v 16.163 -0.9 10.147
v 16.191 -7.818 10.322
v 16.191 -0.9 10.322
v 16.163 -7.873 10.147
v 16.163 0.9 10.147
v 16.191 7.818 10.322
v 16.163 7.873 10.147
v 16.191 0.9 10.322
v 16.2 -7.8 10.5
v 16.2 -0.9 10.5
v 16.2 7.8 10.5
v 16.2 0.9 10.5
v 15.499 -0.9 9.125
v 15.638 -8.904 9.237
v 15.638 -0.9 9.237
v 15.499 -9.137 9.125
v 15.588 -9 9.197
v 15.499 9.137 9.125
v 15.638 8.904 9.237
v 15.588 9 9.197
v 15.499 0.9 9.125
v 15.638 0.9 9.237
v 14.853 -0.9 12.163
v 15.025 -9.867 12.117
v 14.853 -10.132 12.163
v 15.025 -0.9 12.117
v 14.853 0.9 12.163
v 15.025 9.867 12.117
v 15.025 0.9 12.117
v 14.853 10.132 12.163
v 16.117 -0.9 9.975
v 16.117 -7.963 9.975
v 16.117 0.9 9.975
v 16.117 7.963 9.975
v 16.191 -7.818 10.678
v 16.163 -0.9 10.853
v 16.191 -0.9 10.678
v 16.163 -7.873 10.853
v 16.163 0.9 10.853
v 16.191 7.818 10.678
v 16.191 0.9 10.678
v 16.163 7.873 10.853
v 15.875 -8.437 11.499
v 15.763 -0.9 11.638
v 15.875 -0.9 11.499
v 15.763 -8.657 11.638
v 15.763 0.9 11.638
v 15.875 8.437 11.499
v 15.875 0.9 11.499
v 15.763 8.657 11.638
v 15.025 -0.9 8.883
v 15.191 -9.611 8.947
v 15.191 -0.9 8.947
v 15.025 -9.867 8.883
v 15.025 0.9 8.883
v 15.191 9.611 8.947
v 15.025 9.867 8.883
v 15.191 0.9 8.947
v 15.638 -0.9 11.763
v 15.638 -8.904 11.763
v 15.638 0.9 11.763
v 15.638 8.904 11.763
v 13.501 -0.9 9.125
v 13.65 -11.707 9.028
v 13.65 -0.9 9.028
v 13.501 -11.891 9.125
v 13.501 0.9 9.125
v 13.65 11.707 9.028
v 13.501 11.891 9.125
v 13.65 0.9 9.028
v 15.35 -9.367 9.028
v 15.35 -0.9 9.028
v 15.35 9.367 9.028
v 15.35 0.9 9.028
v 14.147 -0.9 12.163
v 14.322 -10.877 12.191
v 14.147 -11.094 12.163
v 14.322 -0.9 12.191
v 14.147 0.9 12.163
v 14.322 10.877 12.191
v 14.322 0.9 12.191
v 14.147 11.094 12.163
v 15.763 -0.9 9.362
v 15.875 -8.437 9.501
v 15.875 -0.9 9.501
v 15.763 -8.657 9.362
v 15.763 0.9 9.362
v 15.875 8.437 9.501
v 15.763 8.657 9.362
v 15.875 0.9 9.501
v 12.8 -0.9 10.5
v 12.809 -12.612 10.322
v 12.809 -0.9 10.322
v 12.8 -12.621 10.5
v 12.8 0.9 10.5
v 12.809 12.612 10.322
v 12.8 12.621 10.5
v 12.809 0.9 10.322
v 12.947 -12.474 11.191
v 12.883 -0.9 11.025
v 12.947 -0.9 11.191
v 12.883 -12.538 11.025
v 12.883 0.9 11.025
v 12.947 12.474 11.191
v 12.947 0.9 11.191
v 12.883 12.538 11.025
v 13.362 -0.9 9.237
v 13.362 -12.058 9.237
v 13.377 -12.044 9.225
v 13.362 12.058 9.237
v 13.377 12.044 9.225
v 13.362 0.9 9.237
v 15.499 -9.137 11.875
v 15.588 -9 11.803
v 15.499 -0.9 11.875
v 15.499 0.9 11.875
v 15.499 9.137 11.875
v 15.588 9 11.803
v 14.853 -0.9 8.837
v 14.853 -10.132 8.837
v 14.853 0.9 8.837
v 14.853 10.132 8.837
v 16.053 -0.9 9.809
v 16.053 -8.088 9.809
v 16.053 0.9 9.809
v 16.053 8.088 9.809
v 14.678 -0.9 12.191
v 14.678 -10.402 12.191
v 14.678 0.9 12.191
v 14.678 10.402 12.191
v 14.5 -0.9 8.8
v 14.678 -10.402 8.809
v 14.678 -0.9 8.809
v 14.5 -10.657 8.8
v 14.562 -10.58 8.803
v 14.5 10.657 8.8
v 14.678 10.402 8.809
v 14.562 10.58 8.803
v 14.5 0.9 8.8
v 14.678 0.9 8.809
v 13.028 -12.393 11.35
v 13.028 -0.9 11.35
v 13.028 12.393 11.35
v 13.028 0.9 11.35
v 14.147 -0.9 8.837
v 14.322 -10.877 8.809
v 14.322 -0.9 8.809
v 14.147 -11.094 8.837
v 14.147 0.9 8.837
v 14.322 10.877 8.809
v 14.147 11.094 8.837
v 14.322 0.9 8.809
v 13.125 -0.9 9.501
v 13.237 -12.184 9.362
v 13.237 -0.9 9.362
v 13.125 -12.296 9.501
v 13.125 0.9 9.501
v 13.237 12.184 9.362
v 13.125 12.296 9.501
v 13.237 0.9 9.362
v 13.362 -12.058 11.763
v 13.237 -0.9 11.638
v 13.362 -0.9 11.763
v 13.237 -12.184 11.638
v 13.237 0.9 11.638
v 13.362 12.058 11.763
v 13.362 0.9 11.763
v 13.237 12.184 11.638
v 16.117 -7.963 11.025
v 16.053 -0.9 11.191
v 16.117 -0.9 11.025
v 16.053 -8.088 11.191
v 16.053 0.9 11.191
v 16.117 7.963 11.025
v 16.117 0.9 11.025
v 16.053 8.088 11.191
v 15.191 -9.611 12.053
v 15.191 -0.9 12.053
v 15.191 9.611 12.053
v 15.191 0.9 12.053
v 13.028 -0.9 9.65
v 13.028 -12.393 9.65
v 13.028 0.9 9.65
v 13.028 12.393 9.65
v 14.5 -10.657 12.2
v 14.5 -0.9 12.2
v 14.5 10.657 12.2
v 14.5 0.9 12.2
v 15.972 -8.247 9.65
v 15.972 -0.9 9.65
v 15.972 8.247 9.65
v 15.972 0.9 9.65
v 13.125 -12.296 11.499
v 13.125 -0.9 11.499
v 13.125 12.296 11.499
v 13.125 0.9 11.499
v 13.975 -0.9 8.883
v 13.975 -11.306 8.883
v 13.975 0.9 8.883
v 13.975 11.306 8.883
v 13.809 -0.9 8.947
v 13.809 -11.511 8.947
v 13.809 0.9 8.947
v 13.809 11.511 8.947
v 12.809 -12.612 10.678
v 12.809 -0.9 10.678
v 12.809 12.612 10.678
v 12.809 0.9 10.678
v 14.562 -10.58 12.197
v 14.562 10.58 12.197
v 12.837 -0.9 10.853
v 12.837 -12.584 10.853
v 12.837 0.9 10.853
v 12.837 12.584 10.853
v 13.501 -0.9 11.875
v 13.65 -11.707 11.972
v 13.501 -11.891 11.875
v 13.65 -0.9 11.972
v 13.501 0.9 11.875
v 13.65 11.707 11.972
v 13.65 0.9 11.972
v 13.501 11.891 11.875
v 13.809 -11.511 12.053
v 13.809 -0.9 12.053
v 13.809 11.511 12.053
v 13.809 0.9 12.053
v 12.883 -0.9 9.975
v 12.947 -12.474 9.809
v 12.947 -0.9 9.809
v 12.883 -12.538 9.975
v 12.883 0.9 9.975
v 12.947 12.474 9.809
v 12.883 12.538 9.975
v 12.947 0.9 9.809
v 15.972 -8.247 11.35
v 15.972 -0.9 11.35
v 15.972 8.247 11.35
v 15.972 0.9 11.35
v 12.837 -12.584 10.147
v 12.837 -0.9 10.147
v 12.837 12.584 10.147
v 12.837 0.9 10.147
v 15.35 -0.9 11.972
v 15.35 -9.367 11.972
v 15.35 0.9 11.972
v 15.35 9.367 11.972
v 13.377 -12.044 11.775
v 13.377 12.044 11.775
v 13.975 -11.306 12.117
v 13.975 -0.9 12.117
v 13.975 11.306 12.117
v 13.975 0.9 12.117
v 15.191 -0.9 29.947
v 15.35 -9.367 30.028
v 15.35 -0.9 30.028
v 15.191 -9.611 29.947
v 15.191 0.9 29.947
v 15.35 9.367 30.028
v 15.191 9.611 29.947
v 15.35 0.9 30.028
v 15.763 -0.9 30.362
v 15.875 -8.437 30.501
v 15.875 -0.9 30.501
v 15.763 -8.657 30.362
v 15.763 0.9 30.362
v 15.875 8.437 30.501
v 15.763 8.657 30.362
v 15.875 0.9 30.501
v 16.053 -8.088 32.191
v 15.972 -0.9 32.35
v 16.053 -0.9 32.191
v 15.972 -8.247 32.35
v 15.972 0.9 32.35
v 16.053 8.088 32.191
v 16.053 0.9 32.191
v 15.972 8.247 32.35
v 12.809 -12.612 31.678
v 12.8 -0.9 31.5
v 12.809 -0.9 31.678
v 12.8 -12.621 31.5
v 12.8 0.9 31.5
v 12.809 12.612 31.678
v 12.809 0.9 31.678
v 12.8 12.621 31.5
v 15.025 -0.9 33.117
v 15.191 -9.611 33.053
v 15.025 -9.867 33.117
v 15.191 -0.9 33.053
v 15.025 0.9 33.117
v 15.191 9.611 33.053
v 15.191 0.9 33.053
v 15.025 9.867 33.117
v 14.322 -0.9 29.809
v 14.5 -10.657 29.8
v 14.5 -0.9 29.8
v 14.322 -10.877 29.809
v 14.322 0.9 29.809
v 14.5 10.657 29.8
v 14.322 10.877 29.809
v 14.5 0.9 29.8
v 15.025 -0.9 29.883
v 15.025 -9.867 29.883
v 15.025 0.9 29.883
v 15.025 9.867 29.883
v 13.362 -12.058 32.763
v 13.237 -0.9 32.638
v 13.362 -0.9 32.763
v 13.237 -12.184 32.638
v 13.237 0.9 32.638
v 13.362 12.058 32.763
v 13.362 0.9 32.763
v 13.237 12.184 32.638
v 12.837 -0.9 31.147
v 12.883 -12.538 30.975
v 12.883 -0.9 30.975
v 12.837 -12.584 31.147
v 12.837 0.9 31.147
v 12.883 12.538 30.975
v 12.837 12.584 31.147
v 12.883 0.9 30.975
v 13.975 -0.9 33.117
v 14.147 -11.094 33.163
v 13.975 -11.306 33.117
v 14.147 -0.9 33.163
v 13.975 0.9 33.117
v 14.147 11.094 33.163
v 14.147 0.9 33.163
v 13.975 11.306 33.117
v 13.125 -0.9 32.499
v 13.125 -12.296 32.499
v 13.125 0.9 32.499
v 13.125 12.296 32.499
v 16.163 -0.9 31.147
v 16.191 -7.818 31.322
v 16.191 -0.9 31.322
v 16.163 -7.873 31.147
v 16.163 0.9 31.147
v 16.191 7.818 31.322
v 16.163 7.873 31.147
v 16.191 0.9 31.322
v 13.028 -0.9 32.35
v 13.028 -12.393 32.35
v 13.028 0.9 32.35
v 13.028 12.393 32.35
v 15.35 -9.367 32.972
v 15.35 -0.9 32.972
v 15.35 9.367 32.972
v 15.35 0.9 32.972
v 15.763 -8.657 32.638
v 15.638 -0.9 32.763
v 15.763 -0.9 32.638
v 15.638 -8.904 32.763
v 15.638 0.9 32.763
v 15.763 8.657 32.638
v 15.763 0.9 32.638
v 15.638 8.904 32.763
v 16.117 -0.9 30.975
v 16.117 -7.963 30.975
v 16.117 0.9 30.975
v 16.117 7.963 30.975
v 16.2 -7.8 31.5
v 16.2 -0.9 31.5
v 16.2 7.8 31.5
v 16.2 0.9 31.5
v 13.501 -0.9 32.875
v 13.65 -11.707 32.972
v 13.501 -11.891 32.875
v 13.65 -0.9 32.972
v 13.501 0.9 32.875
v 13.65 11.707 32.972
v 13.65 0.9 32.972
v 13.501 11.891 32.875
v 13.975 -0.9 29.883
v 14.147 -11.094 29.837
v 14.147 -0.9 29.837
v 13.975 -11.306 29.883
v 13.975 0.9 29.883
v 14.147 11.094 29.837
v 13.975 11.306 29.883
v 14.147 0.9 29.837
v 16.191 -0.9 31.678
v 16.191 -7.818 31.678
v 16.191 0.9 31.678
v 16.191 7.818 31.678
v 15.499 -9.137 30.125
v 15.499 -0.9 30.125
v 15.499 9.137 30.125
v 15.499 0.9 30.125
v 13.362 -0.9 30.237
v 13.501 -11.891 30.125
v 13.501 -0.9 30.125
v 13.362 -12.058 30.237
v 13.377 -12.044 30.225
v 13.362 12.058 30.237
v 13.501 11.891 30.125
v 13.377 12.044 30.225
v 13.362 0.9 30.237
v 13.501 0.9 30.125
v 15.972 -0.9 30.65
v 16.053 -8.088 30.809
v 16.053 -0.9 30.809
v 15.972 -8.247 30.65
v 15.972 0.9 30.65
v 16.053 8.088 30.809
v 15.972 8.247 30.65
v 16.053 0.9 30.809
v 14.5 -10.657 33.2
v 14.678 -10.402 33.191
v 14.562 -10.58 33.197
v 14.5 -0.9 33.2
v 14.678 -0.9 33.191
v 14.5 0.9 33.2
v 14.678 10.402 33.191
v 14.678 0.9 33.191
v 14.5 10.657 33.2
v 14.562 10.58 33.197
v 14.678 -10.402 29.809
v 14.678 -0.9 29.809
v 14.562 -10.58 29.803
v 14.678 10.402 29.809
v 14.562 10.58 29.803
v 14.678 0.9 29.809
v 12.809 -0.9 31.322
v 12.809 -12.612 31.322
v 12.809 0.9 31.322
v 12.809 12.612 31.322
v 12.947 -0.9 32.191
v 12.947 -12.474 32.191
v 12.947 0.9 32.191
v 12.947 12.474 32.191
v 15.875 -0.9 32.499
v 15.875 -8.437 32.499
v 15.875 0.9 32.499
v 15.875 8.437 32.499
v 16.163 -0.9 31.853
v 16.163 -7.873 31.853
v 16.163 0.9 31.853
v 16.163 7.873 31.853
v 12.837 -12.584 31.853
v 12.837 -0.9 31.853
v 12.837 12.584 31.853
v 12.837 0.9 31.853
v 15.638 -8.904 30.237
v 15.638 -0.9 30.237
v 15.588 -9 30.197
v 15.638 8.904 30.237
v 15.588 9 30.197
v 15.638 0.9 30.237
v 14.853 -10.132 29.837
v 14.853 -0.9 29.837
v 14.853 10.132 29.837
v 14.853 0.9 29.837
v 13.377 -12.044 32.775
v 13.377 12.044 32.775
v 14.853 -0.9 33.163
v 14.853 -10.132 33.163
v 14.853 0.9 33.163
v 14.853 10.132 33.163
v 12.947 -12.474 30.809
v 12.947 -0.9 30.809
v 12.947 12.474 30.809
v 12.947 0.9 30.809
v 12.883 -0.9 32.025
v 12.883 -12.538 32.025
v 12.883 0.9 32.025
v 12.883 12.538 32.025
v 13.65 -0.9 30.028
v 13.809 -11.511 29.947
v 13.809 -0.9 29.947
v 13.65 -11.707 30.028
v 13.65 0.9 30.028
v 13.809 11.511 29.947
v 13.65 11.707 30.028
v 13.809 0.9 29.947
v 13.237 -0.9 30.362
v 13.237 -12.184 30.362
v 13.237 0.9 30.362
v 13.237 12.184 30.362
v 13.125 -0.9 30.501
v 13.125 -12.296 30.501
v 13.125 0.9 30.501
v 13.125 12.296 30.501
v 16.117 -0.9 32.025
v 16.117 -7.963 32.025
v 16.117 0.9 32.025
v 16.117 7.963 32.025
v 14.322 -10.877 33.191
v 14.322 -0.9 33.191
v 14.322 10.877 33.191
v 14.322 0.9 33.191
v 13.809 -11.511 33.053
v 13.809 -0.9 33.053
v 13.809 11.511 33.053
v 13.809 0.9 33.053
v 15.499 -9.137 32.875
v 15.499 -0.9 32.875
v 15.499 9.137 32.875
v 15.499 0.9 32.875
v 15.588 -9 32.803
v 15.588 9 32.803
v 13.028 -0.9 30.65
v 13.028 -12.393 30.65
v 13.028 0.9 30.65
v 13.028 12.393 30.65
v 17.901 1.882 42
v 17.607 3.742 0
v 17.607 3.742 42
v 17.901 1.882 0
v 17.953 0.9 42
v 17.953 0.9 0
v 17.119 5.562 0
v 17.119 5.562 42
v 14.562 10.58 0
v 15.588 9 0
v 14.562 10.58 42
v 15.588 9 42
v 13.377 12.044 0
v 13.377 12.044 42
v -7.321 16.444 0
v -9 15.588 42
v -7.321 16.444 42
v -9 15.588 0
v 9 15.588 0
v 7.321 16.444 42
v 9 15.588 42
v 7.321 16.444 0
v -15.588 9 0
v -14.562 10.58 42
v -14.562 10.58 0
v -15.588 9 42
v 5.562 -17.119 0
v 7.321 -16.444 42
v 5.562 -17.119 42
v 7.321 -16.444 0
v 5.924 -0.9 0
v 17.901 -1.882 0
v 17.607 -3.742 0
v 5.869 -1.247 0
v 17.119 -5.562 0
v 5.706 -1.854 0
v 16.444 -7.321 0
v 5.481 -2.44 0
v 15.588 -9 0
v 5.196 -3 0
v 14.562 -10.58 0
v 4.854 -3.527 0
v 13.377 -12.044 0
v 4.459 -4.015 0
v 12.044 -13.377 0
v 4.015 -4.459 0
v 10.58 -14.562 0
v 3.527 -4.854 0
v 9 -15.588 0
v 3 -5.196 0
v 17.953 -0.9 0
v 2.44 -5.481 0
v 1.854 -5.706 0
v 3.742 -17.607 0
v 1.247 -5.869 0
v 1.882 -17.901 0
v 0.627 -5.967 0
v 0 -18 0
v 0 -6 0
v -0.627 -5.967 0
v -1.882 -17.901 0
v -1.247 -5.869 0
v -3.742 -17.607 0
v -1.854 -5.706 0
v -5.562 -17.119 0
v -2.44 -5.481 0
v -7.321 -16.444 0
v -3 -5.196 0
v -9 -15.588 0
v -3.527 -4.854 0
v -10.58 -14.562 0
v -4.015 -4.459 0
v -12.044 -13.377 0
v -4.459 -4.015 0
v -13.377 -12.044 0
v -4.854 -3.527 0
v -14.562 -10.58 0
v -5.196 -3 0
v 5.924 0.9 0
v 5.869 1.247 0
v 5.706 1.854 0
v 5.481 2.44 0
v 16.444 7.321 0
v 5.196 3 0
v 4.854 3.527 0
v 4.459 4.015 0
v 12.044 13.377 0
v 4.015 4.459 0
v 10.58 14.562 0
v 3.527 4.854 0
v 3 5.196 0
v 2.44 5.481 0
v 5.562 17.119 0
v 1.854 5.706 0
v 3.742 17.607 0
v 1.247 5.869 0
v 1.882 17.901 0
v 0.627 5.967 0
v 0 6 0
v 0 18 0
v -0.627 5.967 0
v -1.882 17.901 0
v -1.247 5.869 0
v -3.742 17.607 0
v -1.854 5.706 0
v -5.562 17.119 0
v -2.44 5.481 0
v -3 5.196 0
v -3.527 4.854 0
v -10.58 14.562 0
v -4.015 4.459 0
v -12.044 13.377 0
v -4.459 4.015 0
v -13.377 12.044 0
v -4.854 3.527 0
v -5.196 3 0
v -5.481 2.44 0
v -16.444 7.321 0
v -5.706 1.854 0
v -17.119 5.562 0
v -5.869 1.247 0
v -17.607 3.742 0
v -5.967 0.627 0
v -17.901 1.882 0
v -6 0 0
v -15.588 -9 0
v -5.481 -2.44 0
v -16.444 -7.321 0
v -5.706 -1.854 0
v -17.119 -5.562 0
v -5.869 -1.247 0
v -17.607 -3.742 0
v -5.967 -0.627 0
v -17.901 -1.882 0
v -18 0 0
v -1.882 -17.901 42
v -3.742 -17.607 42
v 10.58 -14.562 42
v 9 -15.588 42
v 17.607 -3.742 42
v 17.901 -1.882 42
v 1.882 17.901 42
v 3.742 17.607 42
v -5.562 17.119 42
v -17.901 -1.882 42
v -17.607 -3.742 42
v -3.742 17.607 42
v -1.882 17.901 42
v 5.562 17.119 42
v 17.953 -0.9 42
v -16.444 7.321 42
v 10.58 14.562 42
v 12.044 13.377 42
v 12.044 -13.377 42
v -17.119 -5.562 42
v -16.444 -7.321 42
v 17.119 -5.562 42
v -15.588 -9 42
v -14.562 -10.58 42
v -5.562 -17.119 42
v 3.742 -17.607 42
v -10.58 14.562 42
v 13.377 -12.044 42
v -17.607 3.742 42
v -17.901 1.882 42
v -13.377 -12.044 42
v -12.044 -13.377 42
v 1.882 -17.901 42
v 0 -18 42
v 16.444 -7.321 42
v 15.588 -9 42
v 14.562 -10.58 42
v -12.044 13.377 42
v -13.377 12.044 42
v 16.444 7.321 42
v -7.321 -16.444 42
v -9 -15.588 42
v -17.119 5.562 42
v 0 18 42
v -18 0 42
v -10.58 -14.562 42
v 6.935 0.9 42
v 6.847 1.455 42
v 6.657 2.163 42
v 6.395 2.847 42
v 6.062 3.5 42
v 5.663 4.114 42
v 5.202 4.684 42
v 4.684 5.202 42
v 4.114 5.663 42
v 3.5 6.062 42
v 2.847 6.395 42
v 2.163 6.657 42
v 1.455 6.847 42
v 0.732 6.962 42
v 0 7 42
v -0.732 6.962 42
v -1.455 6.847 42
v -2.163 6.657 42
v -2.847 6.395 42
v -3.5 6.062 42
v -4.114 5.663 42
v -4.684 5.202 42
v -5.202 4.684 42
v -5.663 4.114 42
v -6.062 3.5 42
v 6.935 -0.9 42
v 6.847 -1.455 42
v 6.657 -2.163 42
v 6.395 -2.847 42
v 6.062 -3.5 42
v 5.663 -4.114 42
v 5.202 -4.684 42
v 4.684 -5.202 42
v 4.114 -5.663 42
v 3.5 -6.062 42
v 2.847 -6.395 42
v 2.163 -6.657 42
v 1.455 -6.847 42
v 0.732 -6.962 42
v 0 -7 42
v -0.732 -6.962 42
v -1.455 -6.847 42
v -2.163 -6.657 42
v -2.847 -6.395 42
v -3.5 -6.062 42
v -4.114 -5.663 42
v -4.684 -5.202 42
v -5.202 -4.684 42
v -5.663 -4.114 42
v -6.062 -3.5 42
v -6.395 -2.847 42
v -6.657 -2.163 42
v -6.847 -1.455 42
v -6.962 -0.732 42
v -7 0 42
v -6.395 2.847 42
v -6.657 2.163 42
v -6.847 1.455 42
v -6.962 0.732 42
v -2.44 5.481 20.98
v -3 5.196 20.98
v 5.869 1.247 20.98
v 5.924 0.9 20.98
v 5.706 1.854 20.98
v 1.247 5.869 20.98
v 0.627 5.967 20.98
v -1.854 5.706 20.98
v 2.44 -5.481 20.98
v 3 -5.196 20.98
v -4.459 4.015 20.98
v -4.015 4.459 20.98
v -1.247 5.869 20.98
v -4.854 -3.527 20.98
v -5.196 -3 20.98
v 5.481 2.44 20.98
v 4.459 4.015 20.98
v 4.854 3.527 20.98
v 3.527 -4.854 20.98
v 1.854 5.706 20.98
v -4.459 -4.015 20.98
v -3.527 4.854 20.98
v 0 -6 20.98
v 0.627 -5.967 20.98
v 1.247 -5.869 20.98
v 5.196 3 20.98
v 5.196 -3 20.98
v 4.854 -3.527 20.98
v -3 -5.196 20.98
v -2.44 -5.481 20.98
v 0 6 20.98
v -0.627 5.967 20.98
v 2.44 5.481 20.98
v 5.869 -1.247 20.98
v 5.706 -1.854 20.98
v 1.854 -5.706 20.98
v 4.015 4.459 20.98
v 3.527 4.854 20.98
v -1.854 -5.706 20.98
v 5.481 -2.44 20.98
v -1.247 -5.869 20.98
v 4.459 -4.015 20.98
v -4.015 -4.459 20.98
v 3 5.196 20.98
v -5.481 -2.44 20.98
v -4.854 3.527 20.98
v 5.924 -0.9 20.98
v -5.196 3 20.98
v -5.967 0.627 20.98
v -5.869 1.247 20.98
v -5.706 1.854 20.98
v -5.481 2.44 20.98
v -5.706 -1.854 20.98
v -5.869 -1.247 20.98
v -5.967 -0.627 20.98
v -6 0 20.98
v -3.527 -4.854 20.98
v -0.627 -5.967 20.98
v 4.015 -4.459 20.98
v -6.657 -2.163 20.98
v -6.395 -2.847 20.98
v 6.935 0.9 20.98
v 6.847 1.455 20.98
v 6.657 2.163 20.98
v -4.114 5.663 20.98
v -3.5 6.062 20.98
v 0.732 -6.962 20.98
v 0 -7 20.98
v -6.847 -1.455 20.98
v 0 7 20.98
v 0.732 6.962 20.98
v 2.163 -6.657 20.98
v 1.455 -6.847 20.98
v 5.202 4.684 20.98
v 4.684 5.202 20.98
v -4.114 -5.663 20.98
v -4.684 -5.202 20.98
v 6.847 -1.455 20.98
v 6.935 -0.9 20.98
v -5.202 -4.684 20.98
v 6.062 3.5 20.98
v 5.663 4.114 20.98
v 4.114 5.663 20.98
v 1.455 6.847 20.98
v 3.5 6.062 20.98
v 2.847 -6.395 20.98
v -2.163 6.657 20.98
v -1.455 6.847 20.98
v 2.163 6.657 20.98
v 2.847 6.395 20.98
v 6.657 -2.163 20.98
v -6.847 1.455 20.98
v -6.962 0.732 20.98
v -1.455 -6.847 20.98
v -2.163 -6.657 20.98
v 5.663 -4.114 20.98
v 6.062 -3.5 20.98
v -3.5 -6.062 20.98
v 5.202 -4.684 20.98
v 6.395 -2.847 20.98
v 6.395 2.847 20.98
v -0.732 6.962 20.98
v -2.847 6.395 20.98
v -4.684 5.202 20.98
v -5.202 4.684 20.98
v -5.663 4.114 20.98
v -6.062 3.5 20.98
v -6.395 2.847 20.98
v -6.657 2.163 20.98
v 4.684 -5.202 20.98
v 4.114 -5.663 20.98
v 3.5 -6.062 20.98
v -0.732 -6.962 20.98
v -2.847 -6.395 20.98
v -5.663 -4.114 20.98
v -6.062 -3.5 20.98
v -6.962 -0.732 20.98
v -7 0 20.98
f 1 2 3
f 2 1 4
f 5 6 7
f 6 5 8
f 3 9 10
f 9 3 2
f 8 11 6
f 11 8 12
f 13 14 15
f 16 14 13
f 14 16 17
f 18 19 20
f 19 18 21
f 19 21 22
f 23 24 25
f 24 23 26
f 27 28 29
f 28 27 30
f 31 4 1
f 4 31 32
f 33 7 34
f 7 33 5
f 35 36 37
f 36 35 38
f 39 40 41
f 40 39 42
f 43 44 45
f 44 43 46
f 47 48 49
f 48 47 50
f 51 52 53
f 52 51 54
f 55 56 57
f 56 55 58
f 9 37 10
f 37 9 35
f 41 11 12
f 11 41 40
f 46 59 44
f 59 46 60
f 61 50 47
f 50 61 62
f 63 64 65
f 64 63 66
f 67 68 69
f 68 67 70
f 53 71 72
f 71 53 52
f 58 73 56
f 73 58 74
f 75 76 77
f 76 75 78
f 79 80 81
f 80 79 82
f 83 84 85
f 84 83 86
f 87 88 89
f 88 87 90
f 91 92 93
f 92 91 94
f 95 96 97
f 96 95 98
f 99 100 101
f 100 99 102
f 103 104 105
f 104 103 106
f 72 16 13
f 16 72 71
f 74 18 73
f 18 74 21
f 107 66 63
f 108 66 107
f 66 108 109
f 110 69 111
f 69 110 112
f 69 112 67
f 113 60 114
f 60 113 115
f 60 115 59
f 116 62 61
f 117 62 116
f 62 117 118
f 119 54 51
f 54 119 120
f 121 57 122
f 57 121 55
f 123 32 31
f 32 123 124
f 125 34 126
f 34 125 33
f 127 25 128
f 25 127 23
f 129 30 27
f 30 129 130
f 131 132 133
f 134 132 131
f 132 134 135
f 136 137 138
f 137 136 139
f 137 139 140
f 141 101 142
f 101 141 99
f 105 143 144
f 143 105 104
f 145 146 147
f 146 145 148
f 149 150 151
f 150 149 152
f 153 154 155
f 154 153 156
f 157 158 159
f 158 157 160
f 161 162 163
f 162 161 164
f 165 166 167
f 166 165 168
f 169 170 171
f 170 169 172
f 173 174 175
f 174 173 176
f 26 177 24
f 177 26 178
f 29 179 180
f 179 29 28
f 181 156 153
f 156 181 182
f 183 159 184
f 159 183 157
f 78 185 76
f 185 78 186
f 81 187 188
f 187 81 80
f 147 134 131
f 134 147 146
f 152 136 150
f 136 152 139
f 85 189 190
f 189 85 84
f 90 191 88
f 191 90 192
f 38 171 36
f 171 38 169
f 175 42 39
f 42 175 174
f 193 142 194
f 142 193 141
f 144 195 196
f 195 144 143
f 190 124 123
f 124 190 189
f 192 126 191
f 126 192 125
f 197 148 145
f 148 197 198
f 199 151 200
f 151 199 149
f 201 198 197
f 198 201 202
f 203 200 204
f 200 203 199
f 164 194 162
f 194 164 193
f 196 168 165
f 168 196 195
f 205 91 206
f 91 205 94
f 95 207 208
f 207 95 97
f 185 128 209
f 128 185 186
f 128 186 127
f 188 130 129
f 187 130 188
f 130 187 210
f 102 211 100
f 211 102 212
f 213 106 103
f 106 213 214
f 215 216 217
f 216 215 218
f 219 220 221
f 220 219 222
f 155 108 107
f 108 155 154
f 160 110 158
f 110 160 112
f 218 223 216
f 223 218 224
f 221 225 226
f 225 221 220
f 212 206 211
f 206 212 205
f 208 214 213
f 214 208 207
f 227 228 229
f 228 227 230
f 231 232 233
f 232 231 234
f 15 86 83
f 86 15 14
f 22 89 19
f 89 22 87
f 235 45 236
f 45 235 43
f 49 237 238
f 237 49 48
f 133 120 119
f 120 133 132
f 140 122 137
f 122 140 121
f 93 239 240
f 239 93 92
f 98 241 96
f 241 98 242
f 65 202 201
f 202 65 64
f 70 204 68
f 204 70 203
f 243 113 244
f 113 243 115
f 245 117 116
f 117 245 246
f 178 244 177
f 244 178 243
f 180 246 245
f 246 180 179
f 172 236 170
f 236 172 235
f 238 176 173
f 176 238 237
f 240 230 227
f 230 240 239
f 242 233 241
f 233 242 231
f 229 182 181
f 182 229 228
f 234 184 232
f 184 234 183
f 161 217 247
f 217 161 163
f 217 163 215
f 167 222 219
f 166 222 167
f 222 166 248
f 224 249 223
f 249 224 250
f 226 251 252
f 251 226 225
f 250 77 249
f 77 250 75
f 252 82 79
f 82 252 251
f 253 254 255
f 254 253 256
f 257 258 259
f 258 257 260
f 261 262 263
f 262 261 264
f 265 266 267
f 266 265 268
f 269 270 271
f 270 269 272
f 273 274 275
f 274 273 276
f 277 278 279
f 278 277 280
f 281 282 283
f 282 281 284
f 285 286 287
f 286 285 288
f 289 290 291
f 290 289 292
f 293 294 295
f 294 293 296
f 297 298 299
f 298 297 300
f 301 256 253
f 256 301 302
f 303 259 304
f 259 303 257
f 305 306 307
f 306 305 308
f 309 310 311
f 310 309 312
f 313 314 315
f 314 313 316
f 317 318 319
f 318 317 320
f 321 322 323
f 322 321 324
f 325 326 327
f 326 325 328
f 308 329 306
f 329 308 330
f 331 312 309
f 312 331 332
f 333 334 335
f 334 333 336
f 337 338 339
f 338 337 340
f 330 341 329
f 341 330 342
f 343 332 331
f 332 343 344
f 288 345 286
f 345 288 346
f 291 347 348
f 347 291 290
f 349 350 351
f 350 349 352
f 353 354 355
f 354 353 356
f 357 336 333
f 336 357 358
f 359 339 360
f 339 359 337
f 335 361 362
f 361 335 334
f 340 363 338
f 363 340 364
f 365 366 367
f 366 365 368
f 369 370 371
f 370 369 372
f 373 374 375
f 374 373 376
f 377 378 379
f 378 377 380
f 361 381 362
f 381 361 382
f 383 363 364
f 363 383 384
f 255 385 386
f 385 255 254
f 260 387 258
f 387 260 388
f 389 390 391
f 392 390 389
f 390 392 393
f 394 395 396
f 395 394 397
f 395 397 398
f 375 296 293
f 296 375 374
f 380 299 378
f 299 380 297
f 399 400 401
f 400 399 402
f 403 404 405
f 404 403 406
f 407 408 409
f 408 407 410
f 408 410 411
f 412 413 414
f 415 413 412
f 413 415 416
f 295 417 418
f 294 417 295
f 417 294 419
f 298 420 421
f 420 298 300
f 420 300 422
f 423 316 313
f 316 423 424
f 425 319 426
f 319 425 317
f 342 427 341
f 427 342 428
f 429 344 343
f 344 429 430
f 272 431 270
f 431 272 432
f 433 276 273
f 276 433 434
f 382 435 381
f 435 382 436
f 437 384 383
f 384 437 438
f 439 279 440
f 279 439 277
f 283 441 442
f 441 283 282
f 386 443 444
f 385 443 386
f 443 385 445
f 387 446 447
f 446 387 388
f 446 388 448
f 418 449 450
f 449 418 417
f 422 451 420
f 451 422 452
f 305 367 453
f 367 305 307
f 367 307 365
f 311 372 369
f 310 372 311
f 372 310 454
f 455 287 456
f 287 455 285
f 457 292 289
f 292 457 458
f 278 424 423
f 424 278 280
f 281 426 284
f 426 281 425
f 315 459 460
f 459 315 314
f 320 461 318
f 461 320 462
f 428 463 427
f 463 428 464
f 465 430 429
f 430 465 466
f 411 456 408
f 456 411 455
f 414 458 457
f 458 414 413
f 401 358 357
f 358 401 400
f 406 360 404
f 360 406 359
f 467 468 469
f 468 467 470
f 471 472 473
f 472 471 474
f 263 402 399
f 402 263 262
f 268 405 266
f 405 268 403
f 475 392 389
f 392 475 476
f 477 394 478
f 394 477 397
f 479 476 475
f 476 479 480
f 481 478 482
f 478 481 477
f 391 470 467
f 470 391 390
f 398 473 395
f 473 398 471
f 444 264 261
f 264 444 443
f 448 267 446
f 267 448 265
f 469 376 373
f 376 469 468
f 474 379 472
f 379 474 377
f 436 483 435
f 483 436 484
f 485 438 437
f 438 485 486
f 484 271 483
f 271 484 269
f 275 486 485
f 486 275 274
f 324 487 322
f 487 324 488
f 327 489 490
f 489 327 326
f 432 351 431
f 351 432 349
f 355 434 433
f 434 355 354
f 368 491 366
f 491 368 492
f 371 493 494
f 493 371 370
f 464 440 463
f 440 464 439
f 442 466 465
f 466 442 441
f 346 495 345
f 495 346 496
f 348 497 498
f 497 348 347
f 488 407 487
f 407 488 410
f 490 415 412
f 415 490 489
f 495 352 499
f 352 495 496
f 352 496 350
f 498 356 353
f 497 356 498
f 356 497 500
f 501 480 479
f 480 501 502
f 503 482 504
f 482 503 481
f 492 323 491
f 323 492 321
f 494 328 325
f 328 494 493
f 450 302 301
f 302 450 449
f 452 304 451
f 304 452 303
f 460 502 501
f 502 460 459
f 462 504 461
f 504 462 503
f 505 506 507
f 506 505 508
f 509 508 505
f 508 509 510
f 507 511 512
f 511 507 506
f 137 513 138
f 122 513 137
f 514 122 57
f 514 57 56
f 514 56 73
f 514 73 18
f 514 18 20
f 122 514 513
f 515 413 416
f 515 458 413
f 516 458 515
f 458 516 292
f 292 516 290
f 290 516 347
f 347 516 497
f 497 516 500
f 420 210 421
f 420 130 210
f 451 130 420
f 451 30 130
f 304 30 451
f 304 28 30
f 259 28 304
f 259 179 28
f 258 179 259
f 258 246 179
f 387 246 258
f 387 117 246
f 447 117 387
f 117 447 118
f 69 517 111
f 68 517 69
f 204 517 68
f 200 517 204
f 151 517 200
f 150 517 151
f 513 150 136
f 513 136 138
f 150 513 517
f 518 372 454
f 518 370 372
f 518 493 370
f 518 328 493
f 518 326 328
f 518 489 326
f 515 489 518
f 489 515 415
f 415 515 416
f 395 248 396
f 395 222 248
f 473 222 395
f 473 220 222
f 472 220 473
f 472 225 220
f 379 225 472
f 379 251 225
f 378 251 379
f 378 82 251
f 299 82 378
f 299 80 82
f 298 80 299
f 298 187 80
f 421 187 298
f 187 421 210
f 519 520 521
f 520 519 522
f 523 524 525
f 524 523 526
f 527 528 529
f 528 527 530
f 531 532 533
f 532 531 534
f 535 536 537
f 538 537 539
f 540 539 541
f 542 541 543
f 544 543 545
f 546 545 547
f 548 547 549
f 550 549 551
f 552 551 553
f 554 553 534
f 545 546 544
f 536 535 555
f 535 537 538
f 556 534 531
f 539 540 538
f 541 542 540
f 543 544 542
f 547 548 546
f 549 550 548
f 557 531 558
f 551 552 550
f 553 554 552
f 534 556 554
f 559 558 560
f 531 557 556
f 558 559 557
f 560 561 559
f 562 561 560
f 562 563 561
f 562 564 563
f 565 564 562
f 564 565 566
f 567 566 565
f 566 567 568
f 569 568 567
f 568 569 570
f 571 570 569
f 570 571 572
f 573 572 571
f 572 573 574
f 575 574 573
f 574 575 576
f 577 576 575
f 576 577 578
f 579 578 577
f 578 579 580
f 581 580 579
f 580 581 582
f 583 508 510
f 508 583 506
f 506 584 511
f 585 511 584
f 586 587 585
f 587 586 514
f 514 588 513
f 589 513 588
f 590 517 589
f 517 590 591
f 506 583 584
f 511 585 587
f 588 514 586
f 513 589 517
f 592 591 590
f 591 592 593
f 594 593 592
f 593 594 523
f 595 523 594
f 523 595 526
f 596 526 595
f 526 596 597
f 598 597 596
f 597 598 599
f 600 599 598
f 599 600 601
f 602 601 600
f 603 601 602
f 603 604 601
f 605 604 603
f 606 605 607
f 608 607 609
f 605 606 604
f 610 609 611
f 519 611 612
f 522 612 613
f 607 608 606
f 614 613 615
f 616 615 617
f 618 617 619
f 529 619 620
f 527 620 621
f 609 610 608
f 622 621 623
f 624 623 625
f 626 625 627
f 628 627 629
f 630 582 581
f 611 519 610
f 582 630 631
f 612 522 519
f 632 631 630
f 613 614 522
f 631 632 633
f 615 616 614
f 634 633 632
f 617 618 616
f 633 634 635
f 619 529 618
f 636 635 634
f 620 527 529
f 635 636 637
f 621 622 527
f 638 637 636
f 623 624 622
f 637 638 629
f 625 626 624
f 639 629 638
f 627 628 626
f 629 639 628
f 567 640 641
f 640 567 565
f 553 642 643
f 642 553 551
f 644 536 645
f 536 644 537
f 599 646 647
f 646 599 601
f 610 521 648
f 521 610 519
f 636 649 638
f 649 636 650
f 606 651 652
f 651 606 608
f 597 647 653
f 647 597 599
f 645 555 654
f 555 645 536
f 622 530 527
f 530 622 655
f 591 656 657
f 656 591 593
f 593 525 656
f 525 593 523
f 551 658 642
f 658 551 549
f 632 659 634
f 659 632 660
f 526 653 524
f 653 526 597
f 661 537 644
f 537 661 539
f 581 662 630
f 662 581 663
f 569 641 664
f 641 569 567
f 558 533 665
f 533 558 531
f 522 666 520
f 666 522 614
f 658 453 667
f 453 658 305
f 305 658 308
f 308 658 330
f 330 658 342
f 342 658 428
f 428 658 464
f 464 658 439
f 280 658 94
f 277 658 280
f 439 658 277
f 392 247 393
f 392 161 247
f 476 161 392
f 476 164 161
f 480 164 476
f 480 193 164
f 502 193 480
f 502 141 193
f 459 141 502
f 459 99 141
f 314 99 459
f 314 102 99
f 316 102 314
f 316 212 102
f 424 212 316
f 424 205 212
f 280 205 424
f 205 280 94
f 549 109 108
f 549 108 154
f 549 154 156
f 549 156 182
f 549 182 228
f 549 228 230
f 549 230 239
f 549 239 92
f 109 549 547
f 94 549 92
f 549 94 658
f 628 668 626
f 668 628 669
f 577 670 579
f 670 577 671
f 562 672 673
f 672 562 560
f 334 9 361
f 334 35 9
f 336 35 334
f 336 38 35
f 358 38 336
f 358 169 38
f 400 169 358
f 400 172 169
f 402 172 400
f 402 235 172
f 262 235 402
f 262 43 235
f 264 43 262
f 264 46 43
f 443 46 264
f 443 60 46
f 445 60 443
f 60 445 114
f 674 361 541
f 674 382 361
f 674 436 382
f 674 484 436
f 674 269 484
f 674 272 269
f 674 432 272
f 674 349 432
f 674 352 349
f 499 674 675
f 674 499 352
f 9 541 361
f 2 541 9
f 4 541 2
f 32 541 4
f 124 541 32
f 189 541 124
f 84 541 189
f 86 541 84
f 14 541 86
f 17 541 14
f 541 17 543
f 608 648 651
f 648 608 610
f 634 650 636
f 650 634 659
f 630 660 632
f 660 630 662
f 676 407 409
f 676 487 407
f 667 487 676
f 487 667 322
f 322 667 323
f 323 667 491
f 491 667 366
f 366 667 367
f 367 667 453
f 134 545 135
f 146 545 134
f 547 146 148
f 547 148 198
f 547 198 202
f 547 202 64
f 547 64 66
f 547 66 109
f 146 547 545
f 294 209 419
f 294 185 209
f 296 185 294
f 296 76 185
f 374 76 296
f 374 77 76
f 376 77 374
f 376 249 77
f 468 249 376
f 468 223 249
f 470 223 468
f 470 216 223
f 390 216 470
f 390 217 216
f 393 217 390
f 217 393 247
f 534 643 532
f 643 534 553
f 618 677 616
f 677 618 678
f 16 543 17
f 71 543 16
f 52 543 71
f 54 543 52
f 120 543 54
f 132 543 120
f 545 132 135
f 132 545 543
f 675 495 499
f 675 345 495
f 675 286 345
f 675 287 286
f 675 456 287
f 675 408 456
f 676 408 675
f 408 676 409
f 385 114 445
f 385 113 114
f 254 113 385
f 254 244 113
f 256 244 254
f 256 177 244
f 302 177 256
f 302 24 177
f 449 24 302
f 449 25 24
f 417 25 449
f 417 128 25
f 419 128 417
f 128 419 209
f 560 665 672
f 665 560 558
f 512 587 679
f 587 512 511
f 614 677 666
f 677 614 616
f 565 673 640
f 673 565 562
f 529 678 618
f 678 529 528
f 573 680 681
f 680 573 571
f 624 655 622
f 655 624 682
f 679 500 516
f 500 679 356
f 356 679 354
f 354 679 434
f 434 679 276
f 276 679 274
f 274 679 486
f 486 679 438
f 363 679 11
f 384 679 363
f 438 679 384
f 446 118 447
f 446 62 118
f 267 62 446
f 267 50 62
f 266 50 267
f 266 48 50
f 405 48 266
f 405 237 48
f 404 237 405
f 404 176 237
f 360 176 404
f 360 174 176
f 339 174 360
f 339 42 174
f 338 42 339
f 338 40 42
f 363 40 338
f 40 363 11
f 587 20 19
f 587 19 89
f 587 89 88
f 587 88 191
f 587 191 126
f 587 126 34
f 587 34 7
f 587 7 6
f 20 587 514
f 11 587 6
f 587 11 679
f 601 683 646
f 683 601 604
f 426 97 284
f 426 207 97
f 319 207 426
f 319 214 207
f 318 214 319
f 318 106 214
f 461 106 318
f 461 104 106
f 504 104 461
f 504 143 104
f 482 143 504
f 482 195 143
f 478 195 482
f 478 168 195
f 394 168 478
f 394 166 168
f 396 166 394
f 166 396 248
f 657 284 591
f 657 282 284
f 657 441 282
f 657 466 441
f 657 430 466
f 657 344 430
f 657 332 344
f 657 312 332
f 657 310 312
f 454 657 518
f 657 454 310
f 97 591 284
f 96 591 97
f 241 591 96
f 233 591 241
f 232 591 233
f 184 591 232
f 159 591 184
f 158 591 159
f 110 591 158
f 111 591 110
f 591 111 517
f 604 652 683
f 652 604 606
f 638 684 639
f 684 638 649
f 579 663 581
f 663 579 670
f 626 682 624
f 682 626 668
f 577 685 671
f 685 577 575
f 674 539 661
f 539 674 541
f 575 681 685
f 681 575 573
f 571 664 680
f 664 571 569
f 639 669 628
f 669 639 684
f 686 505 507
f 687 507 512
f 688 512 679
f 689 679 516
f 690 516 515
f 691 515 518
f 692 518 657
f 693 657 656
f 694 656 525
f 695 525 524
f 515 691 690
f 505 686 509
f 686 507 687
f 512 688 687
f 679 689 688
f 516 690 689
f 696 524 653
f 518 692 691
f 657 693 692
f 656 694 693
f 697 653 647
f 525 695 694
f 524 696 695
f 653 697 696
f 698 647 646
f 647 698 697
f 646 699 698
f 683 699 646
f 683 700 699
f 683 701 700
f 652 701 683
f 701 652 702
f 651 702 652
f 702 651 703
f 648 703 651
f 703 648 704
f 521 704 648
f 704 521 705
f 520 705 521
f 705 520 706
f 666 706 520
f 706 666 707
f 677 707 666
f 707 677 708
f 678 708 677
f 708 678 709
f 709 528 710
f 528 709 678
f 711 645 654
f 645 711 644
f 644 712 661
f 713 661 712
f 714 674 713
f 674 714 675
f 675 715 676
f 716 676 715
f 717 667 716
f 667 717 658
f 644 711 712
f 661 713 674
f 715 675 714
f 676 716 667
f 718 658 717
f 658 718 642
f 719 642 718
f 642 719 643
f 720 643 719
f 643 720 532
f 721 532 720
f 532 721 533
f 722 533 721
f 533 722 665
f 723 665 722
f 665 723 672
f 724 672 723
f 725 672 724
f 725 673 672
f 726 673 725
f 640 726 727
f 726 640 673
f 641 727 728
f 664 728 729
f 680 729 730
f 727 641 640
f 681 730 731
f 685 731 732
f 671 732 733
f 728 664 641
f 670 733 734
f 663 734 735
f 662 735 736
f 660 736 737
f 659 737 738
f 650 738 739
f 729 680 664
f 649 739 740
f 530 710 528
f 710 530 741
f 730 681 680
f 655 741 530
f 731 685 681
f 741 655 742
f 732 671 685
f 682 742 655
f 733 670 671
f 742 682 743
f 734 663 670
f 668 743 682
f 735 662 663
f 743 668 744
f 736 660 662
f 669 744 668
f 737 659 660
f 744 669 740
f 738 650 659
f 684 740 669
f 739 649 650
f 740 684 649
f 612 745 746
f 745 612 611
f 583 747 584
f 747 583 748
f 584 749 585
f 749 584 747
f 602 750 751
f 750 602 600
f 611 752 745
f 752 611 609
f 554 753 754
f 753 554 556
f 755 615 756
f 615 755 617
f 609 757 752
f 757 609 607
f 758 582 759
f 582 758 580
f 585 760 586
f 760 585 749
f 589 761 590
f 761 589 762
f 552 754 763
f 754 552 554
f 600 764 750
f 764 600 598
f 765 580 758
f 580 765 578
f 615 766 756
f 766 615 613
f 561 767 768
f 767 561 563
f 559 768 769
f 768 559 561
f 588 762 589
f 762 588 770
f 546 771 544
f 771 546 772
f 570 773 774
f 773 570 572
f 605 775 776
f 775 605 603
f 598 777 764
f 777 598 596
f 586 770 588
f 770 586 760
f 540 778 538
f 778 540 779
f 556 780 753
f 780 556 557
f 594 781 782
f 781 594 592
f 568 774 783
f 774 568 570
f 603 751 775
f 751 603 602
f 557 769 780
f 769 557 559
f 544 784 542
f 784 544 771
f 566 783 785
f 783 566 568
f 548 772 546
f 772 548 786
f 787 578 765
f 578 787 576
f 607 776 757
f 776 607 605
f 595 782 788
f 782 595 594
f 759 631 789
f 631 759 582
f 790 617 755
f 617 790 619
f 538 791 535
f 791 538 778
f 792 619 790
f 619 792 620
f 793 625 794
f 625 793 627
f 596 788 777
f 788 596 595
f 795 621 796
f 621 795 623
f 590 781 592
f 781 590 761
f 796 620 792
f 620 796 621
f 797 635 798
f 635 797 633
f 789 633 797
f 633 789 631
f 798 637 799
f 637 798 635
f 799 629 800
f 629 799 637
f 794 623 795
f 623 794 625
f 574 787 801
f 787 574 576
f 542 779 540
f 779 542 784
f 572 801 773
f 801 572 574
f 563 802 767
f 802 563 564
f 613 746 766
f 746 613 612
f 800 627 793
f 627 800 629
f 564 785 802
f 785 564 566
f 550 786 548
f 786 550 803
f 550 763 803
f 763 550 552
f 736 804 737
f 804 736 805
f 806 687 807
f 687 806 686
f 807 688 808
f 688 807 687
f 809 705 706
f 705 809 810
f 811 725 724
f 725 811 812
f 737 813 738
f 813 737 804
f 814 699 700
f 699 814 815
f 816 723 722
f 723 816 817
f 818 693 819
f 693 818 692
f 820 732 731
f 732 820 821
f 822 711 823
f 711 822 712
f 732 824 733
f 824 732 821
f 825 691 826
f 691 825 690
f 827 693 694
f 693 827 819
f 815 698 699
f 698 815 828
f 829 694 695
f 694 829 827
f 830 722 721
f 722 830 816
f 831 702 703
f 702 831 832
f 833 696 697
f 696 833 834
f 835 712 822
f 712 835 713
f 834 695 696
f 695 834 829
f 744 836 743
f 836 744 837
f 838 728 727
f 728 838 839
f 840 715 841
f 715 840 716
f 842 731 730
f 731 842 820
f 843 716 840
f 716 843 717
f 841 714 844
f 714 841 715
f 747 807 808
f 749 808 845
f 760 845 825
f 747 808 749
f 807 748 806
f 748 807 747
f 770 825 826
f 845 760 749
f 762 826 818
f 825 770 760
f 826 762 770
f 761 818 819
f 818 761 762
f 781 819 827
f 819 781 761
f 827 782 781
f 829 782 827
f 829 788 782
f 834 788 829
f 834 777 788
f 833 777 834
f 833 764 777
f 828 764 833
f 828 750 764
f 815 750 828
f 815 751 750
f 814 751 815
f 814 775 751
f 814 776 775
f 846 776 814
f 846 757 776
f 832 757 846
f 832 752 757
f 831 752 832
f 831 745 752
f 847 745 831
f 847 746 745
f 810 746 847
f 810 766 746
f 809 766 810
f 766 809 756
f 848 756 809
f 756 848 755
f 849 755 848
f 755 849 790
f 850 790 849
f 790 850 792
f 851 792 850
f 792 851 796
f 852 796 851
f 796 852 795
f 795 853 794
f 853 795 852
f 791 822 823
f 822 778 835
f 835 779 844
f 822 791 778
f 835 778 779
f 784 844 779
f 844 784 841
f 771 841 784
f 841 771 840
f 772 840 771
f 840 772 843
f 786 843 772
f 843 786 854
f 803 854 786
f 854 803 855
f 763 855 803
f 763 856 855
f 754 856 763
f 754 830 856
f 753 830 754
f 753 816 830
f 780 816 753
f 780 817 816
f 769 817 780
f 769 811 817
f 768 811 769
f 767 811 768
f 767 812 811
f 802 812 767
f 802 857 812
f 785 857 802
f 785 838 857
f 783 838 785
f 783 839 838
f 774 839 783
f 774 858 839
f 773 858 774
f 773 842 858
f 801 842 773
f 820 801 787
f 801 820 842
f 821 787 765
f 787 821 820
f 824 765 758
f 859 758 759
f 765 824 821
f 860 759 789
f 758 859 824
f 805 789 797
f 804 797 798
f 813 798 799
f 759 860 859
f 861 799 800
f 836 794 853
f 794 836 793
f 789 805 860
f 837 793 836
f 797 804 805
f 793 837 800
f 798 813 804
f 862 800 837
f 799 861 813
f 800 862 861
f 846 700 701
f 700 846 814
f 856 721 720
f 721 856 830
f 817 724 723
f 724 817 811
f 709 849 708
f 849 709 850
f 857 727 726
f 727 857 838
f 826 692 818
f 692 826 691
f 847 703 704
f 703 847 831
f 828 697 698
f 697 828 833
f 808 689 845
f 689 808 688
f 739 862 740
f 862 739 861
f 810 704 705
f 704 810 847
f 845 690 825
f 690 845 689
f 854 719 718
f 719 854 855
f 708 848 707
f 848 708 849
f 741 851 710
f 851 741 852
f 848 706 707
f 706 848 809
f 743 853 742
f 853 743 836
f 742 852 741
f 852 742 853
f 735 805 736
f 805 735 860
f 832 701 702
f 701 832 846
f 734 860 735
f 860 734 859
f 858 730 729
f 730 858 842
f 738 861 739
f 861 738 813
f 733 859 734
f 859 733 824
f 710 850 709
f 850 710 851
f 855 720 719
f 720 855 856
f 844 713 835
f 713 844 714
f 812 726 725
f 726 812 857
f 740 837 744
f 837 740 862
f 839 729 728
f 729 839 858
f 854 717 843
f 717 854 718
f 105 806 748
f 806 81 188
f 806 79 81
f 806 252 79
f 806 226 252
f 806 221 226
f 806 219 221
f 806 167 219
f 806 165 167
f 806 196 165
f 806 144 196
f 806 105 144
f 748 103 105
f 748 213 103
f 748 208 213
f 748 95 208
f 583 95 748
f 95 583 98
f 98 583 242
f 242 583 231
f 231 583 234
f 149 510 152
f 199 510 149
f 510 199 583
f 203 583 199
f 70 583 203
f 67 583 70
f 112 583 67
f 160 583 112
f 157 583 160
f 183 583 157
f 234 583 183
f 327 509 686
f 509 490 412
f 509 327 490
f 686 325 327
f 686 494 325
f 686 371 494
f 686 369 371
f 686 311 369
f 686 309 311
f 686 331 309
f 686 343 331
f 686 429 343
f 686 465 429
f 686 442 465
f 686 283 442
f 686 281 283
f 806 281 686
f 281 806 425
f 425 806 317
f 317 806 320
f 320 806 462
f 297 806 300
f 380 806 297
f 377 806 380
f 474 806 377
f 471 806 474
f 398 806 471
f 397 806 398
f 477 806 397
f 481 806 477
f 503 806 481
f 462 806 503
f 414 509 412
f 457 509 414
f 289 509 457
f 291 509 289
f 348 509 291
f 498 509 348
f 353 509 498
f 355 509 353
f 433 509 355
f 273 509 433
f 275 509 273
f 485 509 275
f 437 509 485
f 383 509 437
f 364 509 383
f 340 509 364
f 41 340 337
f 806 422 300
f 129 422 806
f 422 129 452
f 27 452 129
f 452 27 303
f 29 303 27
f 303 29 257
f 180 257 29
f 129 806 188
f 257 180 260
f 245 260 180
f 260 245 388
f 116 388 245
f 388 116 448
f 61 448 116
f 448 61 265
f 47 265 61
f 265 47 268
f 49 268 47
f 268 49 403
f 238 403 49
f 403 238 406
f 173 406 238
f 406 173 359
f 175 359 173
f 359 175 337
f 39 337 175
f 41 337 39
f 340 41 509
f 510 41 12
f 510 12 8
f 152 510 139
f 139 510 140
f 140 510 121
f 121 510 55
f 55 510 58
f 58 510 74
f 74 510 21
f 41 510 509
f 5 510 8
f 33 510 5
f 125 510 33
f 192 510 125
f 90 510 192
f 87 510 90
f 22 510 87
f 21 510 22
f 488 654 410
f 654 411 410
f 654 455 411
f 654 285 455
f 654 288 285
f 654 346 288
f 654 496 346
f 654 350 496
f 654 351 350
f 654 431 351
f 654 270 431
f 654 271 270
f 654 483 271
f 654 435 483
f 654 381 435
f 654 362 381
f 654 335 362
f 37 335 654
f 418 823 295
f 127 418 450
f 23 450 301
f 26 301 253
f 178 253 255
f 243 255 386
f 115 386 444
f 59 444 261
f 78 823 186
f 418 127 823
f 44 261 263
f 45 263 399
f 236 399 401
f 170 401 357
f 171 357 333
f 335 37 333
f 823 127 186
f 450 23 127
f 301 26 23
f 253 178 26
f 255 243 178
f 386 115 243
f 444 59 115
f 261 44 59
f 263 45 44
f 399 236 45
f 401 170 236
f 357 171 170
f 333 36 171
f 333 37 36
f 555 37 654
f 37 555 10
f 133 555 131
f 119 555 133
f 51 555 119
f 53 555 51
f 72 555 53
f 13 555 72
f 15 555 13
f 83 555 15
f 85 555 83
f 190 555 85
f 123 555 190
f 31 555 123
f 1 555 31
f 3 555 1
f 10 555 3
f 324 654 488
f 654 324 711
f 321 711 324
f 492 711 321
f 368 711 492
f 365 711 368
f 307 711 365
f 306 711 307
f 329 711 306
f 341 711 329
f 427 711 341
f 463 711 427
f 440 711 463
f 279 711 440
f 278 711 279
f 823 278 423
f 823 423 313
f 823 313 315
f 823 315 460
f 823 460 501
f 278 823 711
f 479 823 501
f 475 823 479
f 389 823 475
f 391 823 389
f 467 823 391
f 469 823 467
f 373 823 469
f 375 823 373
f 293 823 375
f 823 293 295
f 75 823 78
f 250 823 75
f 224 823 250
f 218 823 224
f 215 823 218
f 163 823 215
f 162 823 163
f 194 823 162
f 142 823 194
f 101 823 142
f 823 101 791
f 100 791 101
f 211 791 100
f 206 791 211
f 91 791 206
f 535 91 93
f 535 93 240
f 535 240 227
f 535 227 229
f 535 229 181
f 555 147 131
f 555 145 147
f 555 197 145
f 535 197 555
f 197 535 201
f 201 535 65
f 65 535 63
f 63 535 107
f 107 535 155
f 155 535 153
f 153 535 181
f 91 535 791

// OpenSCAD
// Split shaft coupling 12 mm to 14 mm.
$fn = 60;
eps = 0.02;
shaft_a = 12;
shaft_b = 14;
outer_d = 36;
length = 42;
slit_w = 1.8;
screw_d = 3.4;
module clamp_hole(z) {
    translate([outer_d / 2 - 3.5, -outer_d / 2 - eps, z]) rotate([-90, 0, 0]) cylinder(d = screw_d, h = outer_d + 2 * eps);
    translate([outer_d / 2 - 3.5, outer_d / 2 - 3 - eps, z]) rotate([-90, 0, 0]) cylinder(d = 6.6, h = 3 + 2 * eps);
}
difference() {
    cylinder(d = outer_d, h = length);
    translate([0, 0, -eps]) cylinder(d = shaft_a, h = length / 2 + eps);
    translate([0, 0, length / 2 - eps]) cylinder(d = shaft_b, h = length / 2 + eps);
    translate([0, -slit_w / 2, -eps]) cube([outer_d / 2 + eps, slit_w, length + 2 * eps]);
    clamp_hole(length / 4);
    clamp_hole(3 * length / 4);
}
